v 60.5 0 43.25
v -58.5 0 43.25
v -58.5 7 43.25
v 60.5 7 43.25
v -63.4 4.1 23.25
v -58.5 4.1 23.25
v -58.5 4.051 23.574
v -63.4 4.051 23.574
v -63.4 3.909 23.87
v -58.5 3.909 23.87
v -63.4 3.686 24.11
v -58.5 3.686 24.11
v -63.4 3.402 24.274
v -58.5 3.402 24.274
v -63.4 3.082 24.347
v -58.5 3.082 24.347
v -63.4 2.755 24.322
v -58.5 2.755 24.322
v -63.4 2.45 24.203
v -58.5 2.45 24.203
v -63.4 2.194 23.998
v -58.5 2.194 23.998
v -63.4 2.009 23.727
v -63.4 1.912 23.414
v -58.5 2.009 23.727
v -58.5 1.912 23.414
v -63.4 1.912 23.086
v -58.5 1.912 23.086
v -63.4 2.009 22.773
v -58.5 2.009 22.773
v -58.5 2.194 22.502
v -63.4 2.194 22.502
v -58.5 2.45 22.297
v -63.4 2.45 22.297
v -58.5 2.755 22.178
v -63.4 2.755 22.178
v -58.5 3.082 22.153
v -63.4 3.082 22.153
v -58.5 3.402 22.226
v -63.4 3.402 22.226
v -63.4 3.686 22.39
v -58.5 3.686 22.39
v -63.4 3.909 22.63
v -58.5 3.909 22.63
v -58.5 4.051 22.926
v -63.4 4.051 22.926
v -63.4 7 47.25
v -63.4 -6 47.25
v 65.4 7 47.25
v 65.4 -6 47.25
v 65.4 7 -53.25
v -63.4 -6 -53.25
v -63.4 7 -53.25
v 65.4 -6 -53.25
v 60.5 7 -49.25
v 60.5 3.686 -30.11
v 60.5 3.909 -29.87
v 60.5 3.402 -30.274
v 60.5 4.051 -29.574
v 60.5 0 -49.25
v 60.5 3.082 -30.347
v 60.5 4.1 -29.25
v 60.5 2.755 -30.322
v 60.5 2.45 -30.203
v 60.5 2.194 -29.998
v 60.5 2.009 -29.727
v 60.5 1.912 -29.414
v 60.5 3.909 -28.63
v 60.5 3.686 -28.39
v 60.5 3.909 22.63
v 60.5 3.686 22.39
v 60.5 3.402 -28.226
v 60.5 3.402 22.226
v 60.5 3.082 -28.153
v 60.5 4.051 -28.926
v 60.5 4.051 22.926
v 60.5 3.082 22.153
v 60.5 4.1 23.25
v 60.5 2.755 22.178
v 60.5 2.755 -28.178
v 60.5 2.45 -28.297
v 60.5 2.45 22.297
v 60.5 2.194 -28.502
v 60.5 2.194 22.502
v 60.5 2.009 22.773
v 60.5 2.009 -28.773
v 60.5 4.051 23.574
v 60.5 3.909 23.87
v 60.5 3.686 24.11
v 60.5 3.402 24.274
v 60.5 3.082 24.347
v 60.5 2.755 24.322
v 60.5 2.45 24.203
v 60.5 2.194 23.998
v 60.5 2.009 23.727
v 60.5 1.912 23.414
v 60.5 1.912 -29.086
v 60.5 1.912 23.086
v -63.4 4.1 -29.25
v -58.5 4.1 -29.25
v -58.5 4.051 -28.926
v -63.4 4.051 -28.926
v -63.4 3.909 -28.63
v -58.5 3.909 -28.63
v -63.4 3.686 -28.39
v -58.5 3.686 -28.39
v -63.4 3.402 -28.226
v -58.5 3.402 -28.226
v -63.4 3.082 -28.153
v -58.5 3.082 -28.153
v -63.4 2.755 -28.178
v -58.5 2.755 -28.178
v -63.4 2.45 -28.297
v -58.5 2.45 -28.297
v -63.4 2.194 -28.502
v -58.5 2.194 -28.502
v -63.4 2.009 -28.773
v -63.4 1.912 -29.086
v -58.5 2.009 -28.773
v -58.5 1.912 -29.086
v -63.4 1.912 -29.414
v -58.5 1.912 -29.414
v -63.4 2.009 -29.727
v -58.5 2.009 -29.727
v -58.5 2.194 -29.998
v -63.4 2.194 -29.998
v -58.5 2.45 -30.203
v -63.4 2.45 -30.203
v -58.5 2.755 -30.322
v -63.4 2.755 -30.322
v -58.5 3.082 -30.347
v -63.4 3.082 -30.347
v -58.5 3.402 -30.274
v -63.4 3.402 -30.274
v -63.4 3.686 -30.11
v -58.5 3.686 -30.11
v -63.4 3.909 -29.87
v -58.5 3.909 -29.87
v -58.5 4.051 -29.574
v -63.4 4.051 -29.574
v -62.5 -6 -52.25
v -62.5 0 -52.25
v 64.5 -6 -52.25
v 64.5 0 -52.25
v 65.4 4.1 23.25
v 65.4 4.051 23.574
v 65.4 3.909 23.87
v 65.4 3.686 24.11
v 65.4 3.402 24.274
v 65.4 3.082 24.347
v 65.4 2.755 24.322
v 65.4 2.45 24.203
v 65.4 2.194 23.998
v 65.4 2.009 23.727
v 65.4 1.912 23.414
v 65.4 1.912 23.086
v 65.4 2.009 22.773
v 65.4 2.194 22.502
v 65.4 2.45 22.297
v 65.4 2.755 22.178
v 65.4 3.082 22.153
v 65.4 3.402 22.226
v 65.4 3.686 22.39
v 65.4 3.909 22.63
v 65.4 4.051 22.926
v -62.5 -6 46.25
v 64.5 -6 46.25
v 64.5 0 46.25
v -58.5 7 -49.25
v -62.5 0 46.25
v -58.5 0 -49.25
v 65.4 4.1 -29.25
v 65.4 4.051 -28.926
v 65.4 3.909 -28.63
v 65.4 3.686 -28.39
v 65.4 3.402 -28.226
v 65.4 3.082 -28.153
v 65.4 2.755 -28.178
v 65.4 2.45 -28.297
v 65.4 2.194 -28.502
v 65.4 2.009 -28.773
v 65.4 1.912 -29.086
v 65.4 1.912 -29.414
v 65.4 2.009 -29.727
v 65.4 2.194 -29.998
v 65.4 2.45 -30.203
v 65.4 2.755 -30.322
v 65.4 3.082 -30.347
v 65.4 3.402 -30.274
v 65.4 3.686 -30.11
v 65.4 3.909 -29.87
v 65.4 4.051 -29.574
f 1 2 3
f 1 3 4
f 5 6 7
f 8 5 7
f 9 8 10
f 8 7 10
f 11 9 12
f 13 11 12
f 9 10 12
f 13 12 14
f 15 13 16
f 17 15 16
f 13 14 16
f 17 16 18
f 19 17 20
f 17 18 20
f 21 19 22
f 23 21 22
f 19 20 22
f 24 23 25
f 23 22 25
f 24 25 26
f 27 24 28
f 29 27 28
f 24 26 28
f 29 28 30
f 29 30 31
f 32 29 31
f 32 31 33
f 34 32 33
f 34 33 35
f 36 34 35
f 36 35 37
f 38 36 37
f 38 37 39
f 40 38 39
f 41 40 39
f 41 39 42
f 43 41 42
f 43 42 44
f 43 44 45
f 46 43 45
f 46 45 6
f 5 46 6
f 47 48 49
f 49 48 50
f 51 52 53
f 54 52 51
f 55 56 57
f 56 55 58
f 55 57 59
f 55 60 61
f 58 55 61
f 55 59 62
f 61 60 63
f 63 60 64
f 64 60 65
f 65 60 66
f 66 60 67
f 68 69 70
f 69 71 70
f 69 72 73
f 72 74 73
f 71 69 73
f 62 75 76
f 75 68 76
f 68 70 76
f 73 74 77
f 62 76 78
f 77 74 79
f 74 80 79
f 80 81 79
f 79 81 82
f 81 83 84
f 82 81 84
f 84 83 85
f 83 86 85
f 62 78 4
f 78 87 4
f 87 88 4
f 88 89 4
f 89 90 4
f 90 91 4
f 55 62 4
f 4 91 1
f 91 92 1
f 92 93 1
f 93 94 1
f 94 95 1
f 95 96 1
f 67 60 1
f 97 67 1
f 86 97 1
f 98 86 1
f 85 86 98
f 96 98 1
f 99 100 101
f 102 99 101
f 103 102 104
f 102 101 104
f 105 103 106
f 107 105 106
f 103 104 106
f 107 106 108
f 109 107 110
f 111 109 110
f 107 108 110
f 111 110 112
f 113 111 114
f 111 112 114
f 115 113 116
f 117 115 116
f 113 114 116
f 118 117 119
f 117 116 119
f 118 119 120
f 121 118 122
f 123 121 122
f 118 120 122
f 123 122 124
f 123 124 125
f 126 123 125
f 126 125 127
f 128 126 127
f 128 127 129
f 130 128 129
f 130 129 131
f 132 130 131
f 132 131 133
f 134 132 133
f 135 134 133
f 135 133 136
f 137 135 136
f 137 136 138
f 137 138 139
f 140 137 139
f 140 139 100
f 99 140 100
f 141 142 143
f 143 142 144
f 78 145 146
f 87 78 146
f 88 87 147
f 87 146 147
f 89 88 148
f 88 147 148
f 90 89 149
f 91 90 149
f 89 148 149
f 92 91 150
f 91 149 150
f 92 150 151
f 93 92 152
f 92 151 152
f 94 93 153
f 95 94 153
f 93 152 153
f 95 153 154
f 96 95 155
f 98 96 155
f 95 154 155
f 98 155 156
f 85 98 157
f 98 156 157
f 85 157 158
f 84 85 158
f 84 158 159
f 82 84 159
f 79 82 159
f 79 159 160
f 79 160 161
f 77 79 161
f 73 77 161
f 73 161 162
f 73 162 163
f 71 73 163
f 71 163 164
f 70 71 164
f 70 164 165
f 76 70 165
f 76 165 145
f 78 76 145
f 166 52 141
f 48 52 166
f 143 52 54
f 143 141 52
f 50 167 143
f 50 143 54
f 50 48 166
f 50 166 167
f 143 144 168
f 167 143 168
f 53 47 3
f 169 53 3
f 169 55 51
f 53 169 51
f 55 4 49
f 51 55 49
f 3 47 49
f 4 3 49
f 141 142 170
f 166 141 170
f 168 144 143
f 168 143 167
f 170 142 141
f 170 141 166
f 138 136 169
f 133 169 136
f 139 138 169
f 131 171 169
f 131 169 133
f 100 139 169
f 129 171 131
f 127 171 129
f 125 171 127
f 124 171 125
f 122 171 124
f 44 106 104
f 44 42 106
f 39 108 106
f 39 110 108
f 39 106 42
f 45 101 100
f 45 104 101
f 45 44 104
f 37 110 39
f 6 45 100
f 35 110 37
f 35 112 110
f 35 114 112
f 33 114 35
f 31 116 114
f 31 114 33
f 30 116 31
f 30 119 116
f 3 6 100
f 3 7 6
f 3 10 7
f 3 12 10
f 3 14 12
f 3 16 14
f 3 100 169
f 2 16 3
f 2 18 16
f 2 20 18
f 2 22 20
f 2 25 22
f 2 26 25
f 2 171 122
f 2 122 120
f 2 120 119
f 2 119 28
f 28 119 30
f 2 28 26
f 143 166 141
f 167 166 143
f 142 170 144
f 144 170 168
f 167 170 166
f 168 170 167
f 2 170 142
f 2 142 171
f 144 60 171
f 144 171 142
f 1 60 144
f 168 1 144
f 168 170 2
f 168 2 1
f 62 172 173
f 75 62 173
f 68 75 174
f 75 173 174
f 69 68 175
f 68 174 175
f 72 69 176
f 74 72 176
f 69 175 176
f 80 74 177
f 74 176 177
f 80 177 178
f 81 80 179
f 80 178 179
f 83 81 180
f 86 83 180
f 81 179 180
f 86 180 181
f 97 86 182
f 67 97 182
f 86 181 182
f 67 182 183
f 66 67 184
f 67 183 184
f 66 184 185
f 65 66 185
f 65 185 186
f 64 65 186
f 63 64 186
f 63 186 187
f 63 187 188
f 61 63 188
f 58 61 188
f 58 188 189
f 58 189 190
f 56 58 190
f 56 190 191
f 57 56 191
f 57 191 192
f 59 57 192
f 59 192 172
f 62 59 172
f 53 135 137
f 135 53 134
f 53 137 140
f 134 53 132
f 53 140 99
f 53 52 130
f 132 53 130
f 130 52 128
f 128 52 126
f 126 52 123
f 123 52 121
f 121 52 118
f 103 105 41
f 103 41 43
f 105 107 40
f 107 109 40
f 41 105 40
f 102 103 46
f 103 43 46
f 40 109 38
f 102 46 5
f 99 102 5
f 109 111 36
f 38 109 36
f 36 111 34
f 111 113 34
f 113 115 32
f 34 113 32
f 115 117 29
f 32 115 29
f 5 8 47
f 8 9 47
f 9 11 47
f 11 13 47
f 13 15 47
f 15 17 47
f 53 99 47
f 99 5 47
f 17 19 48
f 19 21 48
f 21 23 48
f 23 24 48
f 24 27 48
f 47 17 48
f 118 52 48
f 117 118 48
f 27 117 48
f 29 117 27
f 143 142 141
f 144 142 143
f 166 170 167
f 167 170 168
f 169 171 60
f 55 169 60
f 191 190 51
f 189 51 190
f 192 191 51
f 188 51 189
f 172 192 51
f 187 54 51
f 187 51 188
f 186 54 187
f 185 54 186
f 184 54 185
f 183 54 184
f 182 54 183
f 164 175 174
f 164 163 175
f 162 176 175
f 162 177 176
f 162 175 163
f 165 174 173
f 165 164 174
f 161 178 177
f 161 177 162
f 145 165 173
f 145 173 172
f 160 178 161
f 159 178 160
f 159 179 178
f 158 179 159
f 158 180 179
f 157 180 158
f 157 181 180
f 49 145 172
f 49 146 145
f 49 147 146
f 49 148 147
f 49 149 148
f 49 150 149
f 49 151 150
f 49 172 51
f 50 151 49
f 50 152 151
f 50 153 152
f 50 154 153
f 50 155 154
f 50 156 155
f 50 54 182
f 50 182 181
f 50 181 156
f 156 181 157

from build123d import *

# Parameters (mm, degrees)
F1_W     = 128.8
F1_H     = 100.5
F1_W_2   = 127
F1_H_2   = 98.5
F2_DEPTH = 6
F3_W     = 128.8
F3_H     = 100.5
F3_W_2   = 119
F3_H_2   = 92.5
F4_DEPTH = 7
F5_R     = 1.1
F6_DEPTH = 128.801
F7_W     = 127
F7_H     = 98.5
F8_DEPTH = 6


with BuildPart() as f2:
    # F1 (on Front) → F2 (new body)
    with BuildSketch(Plane.XZ):
        with Locations((1, -3)):
            Rectangle(F1_W, F1_H)
        with Locations((1, -3)):
            Rectangle(F1_W_2, F1_H_2, mode=Mode.SUBTRACT)
    extrude(amount=F2_DEPTH)

    # F3 (on Front) → F4 (join)
    with BuildSketch(Plane.XZ):
        with Locations((1, -3)):
            Rectangle(F3_W, F3_H)
        with Locations((1, -3)):
            Rectangle(F3_W_2, F3_H_2, mode=Mode.SUBTRACT)
    extrude(amount=-F4_DEPTH)

    # F5 (on face) → F6 (cut, through all)
    with BuildSketch(Plane.YZ.offset(65.4)):
        with Locations((3, -29.25)):
            Circle(F5_R)
        with Locations((3, 23.25)):
            Circle(F5_R)
    extrude(amount=-F6_DEPTH, mode=Mode.SUBTRACT)


with BuildPart() as f8:
    # F7 (on face) → F8 (new body)
    with BuildSketch(Plane.XZ):
        with Locations((1, -3)):
            Rectangle(F7_W, F7_H)
    extrude(amount=F8_DEPTH)


solid = Compound([f2.part, f8.part])
